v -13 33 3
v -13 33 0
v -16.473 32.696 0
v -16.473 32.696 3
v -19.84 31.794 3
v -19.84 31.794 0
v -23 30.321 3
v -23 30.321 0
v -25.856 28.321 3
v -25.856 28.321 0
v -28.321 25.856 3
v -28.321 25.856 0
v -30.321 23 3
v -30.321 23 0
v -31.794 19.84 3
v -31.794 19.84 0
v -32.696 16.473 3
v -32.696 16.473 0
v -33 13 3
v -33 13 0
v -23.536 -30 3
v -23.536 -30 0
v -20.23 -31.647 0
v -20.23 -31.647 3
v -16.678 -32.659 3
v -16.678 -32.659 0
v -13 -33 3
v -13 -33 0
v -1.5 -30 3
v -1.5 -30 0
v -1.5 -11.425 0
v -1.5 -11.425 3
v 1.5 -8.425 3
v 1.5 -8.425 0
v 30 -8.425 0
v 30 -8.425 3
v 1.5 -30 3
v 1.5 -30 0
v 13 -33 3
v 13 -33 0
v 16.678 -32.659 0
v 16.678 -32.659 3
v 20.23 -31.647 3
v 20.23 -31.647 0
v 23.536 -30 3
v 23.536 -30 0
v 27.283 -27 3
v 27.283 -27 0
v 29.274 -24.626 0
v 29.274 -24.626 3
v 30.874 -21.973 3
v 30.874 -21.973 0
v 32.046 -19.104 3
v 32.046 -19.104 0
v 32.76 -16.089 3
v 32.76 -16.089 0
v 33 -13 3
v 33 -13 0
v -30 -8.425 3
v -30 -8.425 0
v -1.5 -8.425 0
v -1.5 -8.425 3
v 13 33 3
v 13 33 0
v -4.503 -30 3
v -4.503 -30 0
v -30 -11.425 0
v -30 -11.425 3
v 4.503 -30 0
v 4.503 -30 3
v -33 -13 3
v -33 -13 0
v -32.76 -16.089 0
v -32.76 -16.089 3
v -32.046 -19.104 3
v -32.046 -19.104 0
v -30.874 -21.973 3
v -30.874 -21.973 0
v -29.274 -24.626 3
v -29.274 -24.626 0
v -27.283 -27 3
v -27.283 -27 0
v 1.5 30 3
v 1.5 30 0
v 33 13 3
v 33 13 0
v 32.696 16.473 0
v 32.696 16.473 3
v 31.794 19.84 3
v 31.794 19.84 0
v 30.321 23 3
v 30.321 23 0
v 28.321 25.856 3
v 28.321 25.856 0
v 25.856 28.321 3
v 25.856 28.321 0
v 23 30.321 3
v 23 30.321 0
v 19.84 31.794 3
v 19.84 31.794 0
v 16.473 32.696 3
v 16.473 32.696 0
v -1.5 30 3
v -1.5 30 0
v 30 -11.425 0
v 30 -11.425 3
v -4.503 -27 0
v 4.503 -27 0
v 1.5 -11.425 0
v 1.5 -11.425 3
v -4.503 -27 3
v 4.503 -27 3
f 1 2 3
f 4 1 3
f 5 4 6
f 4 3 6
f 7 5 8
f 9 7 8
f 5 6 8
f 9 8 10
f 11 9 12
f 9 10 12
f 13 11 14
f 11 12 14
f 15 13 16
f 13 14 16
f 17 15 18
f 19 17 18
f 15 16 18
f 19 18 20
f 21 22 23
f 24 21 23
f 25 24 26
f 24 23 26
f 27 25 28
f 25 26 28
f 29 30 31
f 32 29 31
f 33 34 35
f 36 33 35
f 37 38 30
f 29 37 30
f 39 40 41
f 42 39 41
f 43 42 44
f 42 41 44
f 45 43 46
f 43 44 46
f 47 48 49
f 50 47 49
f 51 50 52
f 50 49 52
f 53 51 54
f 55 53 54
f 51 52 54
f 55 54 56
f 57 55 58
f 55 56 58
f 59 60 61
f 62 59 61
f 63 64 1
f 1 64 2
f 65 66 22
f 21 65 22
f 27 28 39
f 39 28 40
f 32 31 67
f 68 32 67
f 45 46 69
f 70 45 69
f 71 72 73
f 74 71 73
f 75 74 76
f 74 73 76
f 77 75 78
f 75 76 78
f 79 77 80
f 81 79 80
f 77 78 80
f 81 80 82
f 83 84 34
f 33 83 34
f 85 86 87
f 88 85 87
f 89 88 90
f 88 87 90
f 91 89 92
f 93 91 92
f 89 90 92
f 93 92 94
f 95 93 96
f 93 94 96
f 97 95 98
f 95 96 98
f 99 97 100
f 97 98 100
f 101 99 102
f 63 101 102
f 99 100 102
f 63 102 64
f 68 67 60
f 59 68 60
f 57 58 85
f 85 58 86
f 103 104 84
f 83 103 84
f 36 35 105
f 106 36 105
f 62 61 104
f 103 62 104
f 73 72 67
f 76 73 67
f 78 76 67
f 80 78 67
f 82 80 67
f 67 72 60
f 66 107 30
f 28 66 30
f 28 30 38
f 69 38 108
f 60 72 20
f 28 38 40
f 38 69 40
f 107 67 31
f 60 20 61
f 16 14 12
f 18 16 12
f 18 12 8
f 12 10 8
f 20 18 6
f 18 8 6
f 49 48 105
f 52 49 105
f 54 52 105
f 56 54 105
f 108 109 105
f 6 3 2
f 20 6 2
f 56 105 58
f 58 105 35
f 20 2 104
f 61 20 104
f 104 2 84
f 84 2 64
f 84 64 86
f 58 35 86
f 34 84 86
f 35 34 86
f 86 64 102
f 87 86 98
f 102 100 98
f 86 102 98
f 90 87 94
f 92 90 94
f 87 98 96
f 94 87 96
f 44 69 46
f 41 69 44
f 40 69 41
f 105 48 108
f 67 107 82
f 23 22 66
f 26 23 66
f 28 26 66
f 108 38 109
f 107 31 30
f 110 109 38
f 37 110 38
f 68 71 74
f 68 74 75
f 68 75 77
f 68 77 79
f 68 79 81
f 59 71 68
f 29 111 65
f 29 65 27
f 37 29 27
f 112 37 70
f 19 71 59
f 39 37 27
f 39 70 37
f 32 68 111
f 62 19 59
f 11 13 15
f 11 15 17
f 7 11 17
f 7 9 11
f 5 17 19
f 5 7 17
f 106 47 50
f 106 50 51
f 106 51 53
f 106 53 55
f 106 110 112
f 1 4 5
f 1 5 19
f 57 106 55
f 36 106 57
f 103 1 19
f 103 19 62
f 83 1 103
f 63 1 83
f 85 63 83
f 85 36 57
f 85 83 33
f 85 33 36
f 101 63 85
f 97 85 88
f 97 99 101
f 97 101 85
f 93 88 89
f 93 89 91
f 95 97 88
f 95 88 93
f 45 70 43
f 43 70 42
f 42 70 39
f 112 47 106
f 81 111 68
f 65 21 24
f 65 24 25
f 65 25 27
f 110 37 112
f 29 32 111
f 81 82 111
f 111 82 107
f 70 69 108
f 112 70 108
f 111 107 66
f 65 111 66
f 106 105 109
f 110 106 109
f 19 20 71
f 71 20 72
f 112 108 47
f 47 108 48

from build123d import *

# Parameters (mm, degrees)
SALIENTE_EXTRUIR1_DEPTH = 3


with BuildPart() as part:
    # Croquis1 → Saliente-Extruir1 (new body)
    with BuildSketch(Plane.XY):
        with BuildLine():
            Line((-13, -33), (13, -33))
            ThreePointArc((13, -33), (18.477225575, -32.235384062), (23.535653753, -30))
            Line((23.535653753, -30), (4.502856857, -30))
            Line((4.502856857, -30), (4.502856857, -27))
            Line((4.502856857, -27), (27.282856857, -27))
            ThreePointArc((27.282856857, -27), (31.515630385, -20.561179235), (33, -13))
            Line((33, -13), (33, 13))
            ThreePointArc((33, 13), (27.142135624, 27.142135624), (13, 33))
            Line((13, 33), (-13, 33))
            ThreePointArc((-13, 33), (-27.142135624, 27.142135624), (-33, 13))
            Line((-33, 13), (-33, -13))
            ThreePointArc((-33, -13), (-31.515630385, -20.561179235), (-27.282856857, -27))
            Line((-27.282856857, -27), (-4.502856857, -27))
            Line((-4.502856857, -27), (-4.502856857, -30))
            Line((-4.502856857, -30), (-23.535653753, -30))
            ThreePointArc((-23.535653753, -30), (-18.477225575, -32.235384062), (-13, -33))
        make_face()
        Polygon((-30, -11.425), (-30, -8.425), (-1.5, -8.425), (-1.5, 30), (1.5, 30), (1.5, -8.425), (30, -8.425), (30, -11.425), (1.5, -11.425), (1.5, -30), (-1.5, -30), (-1.5, -11.425), align=None, mode=Mode.SUBTRACT)
    extrude(amount=SALIENTE_EXTRUIR1_DEPTH)


solid = part.part
